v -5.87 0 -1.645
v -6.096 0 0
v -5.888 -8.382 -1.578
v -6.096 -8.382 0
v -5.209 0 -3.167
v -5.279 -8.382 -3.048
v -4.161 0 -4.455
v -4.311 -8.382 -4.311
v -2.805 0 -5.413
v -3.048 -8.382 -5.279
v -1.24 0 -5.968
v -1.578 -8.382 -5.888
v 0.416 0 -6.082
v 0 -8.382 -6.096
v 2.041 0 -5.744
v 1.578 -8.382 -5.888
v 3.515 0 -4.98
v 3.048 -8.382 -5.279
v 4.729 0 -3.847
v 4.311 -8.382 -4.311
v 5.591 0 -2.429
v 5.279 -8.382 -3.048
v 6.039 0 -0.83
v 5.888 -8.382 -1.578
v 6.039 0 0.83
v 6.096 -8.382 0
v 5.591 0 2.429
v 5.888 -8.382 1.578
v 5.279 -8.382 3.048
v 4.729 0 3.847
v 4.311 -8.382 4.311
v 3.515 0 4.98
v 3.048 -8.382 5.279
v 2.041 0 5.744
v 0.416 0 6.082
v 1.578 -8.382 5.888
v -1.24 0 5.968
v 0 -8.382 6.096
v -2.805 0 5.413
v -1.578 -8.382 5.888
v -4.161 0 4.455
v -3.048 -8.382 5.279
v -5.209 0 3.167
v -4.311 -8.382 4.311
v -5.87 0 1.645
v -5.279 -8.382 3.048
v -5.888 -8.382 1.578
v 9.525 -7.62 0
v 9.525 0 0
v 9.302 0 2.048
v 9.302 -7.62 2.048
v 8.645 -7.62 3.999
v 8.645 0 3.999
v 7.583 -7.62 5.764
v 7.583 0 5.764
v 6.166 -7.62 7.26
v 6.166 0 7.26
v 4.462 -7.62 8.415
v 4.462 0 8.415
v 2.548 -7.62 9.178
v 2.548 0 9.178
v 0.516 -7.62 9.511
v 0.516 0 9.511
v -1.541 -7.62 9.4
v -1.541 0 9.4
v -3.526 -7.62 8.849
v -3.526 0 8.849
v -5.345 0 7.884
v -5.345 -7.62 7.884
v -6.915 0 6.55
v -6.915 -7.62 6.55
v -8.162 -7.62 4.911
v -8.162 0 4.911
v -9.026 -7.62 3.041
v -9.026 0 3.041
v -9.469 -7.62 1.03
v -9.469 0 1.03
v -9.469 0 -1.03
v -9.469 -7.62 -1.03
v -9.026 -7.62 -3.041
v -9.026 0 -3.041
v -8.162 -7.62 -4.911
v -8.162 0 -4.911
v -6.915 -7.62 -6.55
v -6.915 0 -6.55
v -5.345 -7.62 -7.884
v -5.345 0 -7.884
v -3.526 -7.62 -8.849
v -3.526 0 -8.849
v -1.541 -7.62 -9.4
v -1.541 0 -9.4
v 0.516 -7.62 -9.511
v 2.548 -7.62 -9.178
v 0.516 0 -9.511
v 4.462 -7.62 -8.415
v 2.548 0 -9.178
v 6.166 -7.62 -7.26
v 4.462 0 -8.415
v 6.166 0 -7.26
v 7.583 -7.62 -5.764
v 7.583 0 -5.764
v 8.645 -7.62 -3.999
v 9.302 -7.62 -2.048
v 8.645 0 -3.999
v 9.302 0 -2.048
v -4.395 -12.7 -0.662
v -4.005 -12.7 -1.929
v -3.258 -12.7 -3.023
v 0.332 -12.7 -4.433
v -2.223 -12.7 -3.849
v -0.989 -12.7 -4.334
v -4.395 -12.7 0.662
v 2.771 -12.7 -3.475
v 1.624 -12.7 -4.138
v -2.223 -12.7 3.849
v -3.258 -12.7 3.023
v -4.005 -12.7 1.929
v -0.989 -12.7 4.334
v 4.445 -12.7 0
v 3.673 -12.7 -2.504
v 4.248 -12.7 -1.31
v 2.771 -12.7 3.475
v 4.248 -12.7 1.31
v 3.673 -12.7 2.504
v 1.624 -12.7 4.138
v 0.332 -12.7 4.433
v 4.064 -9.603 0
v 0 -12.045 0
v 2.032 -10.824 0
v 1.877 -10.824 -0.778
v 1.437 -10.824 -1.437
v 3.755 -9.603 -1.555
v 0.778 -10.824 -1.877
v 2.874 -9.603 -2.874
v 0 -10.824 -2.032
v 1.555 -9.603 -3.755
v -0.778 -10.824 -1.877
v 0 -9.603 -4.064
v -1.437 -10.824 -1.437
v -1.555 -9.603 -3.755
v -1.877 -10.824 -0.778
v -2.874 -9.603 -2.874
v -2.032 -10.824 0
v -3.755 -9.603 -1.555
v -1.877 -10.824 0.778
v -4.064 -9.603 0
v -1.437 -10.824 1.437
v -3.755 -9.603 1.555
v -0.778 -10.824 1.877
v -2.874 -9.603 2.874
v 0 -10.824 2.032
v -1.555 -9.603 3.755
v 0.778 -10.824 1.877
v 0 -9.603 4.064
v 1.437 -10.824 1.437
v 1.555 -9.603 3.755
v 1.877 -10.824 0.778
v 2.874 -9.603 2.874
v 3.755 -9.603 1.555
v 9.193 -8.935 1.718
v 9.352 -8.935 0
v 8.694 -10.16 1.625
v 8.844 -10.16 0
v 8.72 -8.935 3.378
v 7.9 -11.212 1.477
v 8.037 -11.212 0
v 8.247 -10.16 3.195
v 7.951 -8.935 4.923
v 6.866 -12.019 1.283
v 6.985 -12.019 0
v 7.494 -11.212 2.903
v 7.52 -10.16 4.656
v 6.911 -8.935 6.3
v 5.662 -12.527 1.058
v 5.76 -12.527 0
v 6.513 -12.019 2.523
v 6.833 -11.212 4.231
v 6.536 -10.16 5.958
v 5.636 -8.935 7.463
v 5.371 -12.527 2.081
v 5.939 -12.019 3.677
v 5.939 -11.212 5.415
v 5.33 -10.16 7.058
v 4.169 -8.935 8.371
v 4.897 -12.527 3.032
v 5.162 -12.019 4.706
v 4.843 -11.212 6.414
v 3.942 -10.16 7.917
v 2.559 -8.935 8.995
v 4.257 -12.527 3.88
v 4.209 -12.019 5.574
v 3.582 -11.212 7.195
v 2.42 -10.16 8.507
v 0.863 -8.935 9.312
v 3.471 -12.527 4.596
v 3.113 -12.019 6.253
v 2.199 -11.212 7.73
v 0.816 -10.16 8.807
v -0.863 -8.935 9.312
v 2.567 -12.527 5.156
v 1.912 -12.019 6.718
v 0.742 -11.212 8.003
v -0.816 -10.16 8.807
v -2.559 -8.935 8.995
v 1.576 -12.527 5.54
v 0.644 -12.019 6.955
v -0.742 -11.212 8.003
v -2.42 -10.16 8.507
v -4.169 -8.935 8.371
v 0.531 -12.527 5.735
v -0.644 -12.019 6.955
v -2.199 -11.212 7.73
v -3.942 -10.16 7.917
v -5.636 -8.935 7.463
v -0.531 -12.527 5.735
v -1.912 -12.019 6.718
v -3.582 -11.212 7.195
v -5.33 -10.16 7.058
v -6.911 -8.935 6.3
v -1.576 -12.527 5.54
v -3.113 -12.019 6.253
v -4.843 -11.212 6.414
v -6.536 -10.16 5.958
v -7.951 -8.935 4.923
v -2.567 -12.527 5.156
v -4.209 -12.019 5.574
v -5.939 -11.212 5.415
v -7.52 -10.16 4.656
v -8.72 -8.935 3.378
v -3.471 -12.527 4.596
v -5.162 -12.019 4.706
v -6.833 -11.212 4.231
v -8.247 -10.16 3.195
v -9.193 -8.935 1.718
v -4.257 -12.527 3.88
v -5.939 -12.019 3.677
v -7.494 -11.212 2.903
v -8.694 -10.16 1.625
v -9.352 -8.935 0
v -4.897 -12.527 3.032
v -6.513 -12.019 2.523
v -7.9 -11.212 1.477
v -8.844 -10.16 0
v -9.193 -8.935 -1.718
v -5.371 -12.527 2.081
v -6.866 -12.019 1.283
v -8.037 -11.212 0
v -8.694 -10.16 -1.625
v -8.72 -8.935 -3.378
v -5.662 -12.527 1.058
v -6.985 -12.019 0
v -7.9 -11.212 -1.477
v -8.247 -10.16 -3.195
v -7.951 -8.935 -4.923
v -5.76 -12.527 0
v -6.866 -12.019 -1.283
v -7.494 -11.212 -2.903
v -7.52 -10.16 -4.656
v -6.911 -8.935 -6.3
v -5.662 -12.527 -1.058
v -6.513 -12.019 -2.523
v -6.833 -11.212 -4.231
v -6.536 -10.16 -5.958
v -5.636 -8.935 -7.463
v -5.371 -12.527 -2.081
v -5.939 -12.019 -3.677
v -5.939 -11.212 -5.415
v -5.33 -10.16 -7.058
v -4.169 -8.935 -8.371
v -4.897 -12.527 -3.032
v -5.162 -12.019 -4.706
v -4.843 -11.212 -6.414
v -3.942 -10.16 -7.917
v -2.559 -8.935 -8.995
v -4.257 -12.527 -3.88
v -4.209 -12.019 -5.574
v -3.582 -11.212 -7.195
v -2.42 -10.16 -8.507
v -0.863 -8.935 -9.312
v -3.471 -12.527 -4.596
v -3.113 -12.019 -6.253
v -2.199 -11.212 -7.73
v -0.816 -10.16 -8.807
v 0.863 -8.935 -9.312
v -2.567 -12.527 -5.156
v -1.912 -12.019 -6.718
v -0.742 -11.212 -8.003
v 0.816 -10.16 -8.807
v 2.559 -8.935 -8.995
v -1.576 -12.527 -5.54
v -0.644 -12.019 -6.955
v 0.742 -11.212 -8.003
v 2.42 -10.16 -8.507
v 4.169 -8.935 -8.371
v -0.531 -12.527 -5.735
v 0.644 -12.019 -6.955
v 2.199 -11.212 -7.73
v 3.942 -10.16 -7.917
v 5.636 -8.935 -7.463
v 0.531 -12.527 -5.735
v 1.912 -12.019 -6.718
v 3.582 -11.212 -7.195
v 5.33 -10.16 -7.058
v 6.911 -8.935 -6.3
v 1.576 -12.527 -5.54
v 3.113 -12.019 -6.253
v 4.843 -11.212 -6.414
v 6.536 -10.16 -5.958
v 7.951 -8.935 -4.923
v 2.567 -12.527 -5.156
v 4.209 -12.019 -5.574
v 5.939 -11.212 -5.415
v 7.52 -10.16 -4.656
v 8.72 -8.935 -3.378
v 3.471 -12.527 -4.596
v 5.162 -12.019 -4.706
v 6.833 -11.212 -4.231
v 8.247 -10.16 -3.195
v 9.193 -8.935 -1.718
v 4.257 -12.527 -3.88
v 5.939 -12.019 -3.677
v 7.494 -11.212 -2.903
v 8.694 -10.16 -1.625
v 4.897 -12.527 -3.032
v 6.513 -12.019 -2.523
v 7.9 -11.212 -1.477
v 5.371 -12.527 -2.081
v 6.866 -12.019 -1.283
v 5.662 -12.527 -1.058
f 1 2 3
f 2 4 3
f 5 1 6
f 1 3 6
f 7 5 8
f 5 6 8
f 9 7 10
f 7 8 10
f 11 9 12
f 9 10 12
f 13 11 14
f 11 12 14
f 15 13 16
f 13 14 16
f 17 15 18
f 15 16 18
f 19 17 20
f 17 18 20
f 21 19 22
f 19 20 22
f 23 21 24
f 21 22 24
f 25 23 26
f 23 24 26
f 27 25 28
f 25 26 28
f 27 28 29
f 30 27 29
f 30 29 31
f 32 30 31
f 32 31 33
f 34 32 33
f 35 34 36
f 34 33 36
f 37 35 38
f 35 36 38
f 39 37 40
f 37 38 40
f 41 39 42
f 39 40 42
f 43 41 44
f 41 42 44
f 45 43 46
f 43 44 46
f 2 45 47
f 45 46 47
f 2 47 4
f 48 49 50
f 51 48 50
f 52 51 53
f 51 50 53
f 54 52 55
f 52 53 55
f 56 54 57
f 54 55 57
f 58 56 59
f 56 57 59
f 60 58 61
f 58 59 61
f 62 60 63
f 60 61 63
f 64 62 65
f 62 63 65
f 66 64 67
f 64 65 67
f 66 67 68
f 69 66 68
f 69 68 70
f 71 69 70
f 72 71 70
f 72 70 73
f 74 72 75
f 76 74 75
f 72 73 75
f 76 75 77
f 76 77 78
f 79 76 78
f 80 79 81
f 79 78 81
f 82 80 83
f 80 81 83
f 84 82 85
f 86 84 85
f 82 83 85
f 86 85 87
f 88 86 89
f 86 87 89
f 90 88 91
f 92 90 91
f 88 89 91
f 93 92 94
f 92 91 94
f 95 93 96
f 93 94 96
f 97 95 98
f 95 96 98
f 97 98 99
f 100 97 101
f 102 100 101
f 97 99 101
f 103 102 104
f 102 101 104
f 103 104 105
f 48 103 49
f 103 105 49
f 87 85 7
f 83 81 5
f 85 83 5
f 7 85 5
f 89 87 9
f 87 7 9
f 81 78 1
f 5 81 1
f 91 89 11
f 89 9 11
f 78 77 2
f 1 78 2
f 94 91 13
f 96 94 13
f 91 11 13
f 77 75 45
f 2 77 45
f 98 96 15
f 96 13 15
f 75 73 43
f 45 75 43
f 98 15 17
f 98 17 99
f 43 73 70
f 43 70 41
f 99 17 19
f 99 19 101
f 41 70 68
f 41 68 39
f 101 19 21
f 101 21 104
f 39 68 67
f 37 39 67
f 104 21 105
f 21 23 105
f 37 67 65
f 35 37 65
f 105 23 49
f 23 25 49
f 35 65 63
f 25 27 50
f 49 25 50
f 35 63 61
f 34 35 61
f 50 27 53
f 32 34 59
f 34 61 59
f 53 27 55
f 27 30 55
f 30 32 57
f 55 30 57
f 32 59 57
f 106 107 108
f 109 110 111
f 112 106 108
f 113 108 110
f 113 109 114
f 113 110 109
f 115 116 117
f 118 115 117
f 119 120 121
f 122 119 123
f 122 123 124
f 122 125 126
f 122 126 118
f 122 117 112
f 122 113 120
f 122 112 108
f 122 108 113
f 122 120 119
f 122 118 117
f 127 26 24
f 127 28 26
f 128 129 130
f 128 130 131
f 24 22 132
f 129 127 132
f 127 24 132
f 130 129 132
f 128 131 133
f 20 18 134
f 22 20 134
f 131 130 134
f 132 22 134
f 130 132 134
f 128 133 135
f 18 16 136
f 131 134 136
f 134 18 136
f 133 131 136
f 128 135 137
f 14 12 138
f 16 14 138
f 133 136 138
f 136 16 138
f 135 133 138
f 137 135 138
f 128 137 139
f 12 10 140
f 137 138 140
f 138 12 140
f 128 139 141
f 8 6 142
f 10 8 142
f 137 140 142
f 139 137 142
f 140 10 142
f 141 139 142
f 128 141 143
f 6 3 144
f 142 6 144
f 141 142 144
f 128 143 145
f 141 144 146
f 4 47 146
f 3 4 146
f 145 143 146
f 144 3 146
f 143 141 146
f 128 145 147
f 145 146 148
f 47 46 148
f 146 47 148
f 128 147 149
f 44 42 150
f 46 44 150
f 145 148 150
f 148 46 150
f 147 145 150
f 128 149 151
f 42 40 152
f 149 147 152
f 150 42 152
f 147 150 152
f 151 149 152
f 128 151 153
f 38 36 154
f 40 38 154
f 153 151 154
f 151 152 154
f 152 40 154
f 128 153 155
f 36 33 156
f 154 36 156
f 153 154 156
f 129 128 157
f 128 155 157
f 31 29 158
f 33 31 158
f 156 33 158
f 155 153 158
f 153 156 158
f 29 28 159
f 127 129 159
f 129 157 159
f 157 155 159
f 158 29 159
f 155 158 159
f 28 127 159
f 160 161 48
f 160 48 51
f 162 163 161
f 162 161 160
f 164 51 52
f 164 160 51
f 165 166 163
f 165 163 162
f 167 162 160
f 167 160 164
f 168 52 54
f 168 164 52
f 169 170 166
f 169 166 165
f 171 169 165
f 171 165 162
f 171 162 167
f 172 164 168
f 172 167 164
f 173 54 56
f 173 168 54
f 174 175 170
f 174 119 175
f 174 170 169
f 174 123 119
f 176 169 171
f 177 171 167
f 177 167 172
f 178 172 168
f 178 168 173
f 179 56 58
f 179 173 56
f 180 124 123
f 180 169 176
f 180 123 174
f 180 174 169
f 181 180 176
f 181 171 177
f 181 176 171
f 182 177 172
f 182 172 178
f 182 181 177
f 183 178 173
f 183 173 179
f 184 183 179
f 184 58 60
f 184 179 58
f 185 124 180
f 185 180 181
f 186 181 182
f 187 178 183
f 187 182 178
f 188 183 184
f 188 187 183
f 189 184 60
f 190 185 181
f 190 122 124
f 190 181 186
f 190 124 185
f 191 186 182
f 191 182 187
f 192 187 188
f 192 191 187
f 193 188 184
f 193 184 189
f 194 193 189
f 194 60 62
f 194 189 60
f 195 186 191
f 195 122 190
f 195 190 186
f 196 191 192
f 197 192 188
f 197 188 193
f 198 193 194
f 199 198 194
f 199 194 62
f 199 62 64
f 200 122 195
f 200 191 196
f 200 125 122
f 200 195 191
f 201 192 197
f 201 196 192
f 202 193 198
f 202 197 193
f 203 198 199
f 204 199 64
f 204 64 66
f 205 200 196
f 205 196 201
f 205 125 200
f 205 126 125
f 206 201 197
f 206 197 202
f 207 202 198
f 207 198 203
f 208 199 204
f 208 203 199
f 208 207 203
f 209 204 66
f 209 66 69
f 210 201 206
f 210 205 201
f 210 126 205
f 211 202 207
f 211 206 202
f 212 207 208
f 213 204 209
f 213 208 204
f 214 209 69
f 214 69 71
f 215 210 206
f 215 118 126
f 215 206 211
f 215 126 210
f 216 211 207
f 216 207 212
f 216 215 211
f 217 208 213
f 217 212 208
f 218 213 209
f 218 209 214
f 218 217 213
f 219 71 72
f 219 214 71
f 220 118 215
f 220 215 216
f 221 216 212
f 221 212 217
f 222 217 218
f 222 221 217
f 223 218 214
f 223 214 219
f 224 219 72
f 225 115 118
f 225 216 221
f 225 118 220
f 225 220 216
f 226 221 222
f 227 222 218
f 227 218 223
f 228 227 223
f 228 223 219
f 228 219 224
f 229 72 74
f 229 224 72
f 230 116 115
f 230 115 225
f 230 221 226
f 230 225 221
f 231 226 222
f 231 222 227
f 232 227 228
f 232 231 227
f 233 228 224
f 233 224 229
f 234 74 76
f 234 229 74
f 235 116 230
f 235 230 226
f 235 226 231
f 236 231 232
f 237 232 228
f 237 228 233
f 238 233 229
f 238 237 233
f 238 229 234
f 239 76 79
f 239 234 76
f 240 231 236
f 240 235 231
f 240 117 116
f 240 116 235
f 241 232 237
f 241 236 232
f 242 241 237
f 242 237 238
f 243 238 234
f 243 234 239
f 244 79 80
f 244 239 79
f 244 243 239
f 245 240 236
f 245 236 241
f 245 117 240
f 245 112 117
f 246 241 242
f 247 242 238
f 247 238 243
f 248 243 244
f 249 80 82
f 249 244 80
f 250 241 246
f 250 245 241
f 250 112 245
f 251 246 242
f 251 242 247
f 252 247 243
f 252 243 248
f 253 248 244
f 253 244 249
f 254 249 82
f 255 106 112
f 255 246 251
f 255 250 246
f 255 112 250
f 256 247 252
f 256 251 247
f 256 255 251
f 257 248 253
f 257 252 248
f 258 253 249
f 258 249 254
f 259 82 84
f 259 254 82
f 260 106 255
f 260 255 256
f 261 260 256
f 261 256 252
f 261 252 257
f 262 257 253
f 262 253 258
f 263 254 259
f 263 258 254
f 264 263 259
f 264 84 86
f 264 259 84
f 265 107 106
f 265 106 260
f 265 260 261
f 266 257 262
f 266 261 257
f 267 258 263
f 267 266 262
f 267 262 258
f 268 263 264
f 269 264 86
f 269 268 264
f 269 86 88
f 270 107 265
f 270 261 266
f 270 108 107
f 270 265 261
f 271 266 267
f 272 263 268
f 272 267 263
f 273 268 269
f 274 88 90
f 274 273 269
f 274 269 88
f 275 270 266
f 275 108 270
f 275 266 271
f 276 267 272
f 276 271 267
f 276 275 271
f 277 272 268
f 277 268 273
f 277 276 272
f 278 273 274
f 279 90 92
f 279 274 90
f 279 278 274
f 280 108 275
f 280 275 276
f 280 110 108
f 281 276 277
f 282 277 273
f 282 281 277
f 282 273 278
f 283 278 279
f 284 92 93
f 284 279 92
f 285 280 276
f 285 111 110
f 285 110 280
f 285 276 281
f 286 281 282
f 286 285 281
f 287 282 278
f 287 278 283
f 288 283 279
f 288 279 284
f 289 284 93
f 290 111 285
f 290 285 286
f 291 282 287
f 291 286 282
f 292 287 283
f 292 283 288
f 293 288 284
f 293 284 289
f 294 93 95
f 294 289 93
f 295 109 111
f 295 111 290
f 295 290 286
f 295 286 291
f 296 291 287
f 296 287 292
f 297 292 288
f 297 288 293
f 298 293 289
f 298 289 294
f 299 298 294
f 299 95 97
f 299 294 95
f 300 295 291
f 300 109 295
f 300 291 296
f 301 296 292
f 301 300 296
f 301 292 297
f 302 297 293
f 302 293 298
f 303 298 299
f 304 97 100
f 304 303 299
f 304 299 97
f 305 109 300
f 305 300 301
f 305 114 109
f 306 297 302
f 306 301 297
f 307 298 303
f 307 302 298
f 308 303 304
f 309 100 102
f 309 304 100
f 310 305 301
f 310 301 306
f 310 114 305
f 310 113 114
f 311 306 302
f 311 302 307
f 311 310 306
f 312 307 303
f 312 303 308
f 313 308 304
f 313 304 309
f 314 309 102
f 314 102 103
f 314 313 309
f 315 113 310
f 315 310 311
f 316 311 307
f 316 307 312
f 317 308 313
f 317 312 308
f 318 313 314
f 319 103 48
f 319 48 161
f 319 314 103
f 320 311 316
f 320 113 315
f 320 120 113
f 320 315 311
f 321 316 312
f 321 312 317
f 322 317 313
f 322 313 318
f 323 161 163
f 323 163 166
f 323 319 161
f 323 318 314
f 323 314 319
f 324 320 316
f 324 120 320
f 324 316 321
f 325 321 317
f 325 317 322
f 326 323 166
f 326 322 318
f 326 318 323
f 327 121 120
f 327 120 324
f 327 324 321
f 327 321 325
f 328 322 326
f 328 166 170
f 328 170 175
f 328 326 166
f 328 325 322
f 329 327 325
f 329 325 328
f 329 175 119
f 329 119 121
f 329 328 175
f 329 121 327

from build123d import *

# Parameters (mm, degrees)
F0_R     = 9.525
F0_R_2   = 6.096
F1_DEPTH = 12.7
F2_R     = 5.08
F3_D     = 12.192
F3_DEPTH = 8.382
F3_TIP   = 3.6628463336


with BuildPart() as f1:
    # F0 (on Front) → F1 (new body)
    with BuildSketch(Plane.XZ):
        Circle(F0_R)
        Circle(F0_R_2, mode=Mode.SUBTRACT)
        Circle(F0_R_2)
    extrude(amount=F1_DEPTH)

    # F2
    f2_edges = [f1.edges().sort_by_distance(p)[0] for p in [
        (-9.525, -12.7, 0),
    ]]
    fillet(f2_edges, radius=F2_R)

    # F3
    with Locations(Plane(origin=(0, 0, 0), x_dir=(1, 0, 0), z_dir=(0, 1, 0))):
        with Locations((0, 0)):
            Hole(F3_D / 2, depth=F3_DEPTH)
            with Locations((0, 0, -(F3_DEPTH + F3_TIP / 2))):  # 118° drill point
                Cone(0, F3_D / 2, F3_TIP, mode=Mode.SUBTRACT)


solid = f1.part
